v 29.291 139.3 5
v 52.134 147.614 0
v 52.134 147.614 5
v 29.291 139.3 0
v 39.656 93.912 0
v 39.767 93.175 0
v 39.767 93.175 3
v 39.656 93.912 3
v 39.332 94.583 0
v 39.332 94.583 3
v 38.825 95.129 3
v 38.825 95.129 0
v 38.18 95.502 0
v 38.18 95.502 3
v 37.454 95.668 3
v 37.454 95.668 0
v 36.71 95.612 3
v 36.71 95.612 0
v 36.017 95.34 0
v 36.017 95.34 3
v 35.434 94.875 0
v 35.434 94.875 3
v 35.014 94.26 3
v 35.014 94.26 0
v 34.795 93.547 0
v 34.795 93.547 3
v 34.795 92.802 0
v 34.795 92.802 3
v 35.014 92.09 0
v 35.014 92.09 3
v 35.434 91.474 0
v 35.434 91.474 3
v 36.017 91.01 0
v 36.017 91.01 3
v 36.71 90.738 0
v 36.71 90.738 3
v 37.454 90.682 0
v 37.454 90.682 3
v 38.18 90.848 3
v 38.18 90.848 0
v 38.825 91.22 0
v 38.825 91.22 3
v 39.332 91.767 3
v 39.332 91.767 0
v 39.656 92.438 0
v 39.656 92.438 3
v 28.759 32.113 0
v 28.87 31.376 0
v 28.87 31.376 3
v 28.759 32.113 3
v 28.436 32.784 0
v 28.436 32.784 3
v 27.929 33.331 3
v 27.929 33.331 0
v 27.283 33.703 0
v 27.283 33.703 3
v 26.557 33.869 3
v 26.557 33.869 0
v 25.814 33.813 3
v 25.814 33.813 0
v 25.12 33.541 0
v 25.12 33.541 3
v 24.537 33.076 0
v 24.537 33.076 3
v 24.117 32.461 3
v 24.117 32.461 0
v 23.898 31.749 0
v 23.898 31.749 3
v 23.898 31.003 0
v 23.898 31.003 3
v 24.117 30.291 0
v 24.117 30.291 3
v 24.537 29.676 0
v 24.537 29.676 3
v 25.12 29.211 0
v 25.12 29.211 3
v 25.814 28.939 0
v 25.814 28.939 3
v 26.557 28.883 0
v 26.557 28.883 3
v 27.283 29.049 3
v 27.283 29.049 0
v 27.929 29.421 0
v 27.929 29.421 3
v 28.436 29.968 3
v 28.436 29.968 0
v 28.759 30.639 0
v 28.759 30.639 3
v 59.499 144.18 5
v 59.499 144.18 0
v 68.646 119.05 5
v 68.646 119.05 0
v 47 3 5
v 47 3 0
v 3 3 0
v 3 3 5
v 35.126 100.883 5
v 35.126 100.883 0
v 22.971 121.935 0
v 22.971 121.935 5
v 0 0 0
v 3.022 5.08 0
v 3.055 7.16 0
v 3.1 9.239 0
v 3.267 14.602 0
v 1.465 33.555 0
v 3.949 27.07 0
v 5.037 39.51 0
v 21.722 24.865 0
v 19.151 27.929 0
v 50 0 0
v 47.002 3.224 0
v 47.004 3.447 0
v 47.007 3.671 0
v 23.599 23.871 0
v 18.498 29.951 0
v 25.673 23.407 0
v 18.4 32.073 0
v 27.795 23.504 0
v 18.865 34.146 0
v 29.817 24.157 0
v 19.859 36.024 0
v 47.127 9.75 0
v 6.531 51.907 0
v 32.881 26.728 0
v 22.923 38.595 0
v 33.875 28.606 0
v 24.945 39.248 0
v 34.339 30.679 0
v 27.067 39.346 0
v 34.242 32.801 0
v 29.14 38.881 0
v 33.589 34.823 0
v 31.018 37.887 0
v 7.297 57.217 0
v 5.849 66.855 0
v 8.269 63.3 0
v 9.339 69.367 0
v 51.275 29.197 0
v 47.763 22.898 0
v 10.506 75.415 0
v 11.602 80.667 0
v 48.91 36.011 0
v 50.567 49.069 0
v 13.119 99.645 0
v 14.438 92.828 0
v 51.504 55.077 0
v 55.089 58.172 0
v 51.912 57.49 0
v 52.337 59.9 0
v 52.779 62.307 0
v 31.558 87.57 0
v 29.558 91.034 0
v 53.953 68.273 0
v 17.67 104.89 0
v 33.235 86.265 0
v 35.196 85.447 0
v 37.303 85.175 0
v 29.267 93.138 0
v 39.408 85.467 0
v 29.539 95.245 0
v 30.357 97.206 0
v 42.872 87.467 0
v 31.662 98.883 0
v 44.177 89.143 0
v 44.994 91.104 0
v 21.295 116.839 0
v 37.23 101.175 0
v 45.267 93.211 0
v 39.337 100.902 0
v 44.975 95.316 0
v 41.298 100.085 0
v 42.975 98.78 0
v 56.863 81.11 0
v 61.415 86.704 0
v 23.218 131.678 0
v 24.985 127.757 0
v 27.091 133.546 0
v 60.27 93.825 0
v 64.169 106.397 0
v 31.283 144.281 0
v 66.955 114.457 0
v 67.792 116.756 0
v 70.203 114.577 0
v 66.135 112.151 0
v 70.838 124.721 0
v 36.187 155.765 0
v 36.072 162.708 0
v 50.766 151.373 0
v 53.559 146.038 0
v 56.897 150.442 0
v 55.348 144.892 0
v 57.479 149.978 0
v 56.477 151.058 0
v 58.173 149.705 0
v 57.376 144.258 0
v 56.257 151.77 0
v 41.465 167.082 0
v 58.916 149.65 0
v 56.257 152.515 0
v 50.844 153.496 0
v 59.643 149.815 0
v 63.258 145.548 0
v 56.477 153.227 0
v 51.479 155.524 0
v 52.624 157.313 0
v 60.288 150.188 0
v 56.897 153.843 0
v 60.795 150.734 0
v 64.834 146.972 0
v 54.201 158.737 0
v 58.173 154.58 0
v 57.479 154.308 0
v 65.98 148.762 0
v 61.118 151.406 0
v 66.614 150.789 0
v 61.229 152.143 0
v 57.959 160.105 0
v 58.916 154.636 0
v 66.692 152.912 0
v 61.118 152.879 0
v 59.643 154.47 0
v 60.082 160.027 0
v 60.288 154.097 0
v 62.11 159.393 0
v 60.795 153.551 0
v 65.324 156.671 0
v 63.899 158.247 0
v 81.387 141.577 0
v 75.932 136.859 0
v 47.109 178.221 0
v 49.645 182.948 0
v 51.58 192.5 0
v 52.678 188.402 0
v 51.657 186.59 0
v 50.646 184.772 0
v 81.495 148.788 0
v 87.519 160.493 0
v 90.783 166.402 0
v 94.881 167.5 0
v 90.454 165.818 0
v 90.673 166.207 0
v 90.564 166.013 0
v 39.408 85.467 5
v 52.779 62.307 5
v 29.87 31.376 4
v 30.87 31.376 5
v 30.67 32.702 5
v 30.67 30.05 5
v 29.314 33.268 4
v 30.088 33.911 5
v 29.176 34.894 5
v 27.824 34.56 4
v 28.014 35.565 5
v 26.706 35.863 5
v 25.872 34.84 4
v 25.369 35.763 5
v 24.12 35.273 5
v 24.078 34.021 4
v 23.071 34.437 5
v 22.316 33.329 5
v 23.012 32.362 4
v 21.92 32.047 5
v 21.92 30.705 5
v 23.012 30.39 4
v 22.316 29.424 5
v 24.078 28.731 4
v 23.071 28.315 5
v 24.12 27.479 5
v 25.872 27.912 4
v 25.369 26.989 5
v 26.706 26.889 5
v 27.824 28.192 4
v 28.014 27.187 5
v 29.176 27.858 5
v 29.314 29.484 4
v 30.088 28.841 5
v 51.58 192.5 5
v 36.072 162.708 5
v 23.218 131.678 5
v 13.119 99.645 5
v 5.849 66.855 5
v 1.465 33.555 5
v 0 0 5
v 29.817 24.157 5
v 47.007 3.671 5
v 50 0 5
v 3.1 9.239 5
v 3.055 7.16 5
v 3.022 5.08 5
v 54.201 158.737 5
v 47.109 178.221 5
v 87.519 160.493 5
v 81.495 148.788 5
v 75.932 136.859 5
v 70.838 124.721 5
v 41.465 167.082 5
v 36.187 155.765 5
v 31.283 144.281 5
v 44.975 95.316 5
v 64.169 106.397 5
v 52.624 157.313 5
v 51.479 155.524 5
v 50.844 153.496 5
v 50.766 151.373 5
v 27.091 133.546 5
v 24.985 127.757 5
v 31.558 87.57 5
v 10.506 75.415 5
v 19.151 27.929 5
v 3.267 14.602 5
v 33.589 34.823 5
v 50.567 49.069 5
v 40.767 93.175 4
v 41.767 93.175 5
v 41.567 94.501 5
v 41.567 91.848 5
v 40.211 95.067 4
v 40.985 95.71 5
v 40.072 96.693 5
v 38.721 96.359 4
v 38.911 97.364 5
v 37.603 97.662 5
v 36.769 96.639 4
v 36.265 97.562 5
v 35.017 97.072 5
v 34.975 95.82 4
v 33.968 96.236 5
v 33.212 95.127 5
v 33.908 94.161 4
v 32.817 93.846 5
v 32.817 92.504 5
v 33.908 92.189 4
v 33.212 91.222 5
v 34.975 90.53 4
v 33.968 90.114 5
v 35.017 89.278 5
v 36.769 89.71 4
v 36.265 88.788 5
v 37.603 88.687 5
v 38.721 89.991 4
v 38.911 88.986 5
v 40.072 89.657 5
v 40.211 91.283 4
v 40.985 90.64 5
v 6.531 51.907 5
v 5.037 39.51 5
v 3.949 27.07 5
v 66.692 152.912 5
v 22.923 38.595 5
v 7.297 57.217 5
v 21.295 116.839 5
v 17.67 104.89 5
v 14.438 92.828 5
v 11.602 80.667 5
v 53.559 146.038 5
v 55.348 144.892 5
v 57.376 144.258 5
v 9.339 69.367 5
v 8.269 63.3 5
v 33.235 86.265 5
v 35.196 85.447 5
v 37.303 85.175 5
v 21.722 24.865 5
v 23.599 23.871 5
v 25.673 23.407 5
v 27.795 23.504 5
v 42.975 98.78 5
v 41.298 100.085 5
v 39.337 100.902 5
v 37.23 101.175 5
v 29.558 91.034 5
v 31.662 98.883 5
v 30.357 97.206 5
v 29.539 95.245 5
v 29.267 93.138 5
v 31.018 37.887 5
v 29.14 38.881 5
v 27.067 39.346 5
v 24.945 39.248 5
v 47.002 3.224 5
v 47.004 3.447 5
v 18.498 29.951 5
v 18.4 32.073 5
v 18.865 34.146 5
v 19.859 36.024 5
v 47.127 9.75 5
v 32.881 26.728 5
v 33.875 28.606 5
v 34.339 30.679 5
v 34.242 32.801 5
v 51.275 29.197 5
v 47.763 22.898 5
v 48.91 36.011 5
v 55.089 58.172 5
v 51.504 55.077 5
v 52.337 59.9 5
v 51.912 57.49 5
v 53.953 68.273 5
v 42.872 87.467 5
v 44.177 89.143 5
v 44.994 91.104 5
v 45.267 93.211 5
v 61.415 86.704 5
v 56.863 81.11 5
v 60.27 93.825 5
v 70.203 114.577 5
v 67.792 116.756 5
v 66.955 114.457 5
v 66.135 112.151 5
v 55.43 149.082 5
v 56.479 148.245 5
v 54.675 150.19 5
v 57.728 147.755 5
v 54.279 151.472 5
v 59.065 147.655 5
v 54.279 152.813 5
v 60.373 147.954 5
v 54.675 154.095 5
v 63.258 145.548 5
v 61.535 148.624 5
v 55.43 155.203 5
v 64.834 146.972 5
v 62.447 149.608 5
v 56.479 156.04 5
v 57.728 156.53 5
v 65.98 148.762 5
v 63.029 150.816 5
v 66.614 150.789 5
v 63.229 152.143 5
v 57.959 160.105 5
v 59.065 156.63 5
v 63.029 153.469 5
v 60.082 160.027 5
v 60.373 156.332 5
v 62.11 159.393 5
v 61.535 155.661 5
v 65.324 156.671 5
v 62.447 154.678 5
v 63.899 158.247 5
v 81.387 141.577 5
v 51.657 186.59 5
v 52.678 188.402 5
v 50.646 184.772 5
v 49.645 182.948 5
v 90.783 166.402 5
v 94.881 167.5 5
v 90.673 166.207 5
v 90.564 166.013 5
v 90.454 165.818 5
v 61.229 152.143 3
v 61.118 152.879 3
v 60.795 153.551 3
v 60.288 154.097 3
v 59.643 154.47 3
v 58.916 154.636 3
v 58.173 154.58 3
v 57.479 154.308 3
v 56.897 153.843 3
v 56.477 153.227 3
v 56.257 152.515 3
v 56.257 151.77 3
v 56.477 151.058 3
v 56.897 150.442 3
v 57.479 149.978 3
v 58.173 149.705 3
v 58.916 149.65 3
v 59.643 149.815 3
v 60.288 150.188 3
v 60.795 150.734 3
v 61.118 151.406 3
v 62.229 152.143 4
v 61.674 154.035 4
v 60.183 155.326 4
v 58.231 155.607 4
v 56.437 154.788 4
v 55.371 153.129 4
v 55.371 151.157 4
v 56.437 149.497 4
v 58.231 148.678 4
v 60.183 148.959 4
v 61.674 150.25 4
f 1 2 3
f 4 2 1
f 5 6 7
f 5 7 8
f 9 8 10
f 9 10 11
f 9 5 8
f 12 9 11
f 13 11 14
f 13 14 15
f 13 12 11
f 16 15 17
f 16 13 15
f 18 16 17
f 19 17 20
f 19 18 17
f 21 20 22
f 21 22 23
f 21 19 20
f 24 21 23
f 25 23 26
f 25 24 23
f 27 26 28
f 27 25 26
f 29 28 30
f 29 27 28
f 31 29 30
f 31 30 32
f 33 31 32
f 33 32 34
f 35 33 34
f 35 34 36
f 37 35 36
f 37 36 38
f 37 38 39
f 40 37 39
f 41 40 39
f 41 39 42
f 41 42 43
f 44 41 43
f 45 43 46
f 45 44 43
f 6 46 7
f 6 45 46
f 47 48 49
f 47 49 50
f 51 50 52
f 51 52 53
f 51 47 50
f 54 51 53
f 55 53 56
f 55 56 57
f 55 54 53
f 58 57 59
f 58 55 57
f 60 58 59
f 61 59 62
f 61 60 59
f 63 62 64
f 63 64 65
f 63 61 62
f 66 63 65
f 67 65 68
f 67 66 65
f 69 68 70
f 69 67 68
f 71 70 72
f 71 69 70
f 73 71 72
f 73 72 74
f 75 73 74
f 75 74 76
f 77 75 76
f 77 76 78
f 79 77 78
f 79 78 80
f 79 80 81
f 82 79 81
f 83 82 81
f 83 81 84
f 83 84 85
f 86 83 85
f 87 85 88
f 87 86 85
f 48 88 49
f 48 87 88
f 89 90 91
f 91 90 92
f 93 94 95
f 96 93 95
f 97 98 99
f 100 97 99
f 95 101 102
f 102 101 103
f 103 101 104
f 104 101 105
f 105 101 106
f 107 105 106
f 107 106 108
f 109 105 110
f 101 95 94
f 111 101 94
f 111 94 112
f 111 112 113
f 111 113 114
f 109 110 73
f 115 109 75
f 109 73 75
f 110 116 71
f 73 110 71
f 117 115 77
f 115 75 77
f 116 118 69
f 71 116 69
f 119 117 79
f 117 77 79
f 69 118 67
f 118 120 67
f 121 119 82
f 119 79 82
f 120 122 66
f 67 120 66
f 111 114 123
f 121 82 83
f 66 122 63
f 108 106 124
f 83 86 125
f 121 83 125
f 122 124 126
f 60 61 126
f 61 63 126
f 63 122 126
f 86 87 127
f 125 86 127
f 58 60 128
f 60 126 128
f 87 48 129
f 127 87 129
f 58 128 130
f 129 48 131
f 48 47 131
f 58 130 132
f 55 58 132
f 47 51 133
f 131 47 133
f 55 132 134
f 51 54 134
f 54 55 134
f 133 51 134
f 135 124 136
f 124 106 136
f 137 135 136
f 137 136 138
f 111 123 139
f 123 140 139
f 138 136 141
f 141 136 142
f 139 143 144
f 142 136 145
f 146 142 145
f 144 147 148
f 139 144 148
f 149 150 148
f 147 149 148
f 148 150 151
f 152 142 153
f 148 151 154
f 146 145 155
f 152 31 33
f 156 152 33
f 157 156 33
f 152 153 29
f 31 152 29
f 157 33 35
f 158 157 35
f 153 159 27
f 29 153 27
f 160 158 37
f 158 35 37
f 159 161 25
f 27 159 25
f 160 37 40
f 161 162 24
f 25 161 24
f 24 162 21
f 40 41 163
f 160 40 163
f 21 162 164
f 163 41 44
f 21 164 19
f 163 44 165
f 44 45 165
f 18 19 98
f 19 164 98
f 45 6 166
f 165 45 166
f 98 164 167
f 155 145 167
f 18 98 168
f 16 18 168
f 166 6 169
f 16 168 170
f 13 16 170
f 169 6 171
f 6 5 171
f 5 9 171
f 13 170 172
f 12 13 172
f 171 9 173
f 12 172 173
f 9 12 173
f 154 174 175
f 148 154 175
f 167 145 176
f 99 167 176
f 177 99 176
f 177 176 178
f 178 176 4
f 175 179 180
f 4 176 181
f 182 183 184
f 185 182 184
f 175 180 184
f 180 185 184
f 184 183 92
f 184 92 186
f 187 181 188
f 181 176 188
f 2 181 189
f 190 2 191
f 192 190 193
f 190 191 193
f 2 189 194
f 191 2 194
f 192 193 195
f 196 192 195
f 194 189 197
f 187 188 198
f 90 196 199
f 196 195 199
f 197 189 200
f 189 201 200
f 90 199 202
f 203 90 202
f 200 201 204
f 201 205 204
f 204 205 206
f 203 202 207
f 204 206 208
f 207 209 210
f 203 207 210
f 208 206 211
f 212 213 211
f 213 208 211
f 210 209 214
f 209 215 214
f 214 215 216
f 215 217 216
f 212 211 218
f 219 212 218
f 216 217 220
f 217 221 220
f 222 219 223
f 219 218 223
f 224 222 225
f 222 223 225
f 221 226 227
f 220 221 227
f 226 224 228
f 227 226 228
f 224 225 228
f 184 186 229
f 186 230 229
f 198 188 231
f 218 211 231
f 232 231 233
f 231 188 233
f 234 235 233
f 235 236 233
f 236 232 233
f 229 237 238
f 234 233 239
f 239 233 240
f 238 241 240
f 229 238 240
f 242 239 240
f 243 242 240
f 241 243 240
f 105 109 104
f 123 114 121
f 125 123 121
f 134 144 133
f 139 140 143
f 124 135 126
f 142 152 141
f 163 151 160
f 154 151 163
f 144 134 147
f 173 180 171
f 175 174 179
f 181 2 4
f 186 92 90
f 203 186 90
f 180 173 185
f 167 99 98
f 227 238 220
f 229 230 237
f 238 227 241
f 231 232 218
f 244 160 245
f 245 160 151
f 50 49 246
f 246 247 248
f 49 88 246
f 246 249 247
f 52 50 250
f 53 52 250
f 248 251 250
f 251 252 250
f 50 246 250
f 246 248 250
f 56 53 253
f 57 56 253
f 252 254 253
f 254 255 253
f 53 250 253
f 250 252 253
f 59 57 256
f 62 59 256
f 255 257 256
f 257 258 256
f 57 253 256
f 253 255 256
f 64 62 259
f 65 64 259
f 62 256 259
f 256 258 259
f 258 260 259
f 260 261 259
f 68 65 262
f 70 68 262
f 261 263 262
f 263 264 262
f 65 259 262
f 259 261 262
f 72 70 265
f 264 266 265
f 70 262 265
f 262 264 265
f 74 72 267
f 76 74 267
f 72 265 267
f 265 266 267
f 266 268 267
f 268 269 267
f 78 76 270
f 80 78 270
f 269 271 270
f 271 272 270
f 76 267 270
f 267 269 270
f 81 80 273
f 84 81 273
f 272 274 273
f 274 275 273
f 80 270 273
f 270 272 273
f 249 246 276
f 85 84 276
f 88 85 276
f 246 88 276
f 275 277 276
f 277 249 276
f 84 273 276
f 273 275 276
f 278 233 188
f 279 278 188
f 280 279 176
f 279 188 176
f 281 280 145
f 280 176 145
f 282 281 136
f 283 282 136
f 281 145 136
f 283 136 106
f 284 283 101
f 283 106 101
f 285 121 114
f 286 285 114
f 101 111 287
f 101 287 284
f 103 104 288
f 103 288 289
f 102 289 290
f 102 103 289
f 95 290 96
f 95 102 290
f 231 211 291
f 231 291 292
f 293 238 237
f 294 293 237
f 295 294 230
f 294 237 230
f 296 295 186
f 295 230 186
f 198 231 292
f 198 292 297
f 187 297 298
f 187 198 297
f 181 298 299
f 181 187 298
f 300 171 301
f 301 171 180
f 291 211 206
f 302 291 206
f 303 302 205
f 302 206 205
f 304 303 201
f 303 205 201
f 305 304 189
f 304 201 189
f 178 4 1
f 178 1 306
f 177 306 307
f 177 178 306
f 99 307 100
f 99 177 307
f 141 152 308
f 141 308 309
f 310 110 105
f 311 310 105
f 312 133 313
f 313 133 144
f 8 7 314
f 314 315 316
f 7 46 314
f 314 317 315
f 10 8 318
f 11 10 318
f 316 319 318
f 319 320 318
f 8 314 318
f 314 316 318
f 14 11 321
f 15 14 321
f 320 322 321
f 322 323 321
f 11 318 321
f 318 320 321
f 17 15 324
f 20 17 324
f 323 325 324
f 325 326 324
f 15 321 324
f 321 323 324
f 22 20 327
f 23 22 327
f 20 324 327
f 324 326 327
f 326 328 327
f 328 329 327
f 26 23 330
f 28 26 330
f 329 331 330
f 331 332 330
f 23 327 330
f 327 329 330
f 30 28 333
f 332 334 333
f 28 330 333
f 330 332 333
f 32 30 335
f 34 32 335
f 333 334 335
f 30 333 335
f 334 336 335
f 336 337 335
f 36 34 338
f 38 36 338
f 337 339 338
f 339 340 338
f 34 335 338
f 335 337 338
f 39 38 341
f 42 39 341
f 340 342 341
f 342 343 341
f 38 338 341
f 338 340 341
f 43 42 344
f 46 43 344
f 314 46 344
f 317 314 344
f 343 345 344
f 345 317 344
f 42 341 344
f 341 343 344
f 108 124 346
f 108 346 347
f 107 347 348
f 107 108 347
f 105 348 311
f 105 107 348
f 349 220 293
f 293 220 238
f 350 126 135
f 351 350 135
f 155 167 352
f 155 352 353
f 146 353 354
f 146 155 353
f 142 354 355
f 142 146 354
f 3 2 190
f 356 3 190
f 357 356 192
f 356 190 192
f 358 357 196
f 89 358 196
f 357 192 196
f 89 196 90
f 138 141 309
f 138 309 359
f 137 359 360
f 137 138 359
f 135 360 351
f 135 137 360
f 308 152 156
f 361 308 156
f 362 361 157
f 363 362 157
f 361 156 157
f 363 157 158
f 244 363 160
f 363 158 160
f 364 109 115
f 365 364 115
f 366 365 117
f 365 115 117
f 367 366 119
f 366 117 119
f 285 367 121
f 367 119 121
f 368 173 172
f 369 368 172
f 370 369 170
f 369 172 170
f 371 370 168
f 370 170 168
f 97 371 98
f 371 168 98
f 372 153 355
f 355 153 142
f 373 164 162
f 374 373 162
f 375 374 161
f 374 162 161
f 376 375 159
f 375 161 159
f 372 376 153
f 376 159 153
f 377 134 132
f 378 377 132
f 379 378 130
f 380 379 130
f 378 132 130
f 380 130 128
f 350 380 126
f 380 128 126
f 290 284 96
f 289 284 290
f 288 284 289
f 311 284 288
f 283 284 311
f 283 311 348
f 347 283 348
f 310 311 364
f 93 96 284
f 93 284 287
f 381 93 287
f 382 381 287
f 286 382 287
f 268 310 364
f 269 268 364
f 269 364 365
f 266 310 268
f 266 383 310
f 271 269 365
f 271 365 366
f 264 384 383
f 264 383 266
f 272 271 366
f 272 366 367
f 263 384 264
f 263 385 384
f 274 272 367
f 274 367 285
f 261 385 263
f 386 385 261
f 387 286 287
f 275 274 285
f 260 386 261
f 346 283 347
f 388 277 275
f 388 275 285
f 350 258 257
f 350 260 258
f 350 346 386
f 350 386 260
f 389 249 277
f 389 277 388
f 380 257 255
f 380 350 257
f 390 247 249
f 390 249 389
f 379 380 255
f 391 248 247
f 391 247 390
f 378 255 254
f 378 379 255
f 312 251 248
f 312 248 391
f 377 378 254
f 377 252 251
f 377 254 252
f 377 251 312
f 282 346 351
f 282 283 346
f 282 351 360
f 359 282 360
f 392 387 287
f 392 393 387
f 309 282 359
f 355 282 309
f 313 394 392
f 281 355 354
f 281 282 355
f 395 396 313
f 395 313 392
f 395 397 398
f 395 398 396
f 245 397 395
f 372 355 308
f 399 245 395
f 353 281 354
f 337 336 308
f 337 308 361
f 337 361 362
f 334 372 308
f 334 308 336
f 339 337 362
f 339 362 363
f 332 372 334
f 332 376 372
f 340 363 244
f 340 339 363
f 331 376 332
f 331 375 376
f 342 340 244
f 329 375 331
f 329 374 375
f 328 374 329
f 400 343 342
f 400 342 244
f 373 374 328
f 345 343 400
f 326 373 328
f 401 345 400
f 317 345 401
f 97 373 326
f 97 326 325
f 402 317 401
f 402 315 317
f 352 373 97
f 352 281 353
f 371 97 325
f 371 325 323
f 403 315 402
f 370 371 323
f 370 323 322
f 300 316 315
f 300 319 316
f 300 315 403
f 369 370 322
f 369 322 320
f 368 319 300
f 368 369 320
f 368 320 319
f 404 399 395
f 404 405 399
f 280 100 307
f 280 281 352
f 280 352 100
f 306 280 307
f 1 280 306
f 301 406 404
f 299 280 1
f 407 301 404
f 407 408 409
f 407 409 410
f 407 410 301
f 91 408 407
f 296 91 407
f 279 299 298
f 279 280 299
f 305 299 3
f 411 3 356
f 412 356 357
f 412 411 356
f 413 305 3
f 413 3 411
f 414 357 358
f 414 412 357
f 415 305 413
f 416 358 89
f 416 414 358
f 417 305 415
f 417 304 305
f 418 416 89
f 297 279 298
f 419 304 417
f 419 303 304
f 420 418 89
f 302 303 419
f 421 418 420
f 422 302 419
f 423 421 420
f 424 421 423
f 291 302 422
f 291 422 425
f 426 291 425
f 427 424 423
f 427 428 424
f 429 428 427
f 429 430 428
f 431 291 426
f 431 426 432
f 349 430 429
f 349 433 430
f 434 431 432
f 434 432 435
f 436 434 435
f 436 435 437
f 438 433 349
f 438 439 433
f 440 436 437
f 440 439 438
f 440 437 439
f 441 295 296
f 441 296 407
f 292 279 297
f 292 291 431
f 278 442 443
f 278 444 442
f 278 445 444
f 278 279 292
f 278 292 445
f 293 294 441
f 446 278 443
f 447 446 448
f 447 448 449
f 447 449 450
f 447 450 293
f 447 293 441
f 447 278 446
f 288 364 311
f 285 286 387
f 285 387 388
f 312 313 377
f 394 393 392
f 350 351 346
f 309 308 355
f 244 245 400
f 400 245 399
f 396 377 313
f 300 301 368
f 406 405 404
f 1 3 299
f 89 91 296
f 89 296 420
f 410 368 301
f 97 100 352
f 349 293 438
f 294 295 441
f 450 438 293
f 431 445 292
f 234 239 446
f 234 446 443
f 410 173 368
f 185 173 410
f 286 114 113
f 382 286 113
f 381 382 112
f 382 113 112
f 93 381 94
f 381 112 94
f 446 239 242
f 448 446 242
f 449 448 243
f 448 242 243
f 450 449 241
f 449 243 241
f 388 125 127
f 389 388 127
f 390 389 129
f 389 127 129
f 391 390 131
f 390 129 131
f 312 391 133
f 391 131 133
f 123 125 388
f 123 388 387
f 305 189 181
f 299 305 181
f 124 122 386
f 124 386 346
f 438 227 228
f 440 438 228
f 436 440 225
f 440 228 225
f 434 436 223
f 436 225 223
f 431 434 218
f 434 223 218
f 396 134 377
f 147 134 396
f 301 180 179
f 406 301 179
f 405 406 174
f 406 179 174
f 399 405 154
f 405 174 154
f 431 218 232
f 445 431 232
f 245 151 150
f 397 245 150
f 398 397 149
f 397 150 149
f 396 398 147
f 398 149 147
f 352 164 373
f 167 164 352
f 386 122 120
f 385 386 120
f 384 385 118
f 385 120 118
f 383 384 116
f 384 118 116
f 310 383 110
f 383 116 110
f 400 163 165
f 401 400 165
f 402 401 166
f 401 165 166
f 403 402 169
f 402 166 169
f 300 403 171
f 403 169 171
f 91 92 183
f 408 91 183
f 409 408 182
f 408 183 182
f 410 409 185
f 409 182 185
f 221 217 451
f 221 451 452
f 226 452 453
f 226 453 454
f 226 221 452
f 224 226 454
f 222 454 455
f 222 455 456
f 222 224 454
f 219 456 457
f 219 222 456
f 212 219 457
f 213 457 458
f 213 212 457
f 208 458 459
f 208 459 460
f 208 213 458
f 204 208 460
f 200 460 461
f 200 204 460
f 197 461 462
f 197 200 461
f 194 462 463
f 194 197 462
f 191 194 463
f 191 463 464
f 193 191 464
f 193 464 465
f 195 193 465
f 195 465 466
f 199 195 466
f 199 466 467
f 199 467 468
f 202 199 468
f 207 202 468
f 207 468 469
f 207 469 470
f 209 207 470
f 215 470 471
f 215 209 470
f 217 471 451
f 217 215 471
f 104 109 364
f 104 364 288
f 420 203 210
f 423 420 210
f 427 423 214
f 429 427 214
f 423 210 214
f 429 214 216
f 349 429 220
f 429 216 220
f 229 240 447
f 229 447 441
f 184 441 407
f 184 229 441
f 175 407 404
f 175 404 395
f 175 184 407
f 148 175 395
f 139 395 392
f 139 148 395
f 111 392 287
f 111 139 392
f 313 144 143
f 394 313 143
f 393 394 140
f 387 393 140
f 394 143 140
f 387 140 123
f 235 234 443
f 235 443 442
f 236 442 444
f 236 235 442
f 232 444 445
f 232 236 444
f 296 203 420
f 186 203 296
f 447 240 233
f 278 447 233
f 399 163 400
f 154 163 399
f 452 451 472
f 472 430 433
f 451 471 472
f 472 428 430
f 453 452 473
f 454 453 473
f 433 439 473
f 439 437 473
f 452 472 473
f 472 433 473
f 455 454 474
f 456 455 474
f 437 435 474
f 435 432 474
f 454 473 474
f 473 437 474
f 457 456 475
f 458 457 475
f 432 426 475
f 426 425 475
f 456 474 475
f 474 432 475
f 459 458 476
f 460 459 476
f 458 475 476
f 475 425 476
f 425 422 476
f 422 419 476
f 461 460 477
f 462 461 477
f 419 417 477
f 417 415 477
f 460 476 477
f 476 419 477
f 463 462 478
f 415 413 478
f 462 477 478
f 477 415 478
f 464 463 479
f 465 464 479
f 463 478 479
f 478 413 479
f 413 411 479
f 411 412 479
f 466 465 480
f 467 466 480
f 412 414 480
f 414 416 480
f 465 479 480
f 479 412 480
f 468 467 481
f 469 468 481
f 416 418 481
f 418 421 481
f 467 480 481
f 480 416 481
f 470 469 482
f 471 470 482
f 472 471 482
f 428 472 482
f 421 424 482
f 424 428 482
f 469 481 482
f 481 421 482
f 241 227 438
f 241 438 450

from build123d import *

# Parameters (mm, degrees)
SKETCH_R     = 2.5
PAD_DEPTH    = 5
CHAMFER_SIZE = 2


with BuildPart() as part:
    # Sketch → Pad (new body)
    with BuildSketch(Plane.XY):
        with BuildLine():
            ThreePointArc((51.58022, 192.5), (13.118557, 99.645332), (0, 0))
            Line((50, 0), (0, 0))
            ThreePointArc((94.88149, 167.5), (61.414848, 86.70438), (50, 0))
            Line((94.88149, 167.5), (51.58022, 192.5))
        make_face()
        with Locations((26.369909, 31.376067)):
            Circle(SKETCH_R, mode=Mode.SUBTRACT)
        with Locations((58.729197, 152.142574)):
            Circle(SKETCH_R, mode=Mode.SUBTRACT)
        with Locations((37.266703, 93.174856)):
            Circle(SKETCH_R, mode=Mode.SUBTRACT)
        with BuildLine():
            ThreePointArc((52.678296, 188.401924), (51.150584, 185.681361), (49.645145, 182.948411))
            Line((57.959305, 160.105442), (49.645145, 182.948411))
            ThreePointArc((65.323984, 156.671236), (62.110143, 159.393037), (57.959305, 160.105442))
            Line((65.323984, 156.671236), (90.453773, 165.817731))
            ThreePointArc((90.783414, 166.401924), (90.618448, 166.109909), (90.453773, 165.817731))
            Line((90.783414, 166.401924), (52.678296, 188.401924))
        make_face(mode=Mode.SUBTRACT)
        with BuildLine():
            Line((47, 3), (3, 3))
            ThreePointArc((3.099971, 9.239456), (3.037245, 6.119932), (3, 3))
            Line((21.721729, 24.864967), (3.099971, 9.239456))
            ThreePointArc((21.721729, 24.864967), (25.672663, 23.40651), (29.816831, 24.156737))
            Line((29.816831, 24.156737), (47.006619, 3.670746))
            ThreePointArc((47.006619, 3.670746), (47.003143, 3.335375), (47, 3))
        make_face(mode=Mode.SUBTRACT)
        with BuildLine():
            ThreePointArc((19.858808, 36.024247), (18.400351, 32.073313), (19.150579, 27.929145))
            Line((19.150579, 27.929145), (3.267378, 14.601557))
            ThreePointArc((6.531221, 51.907447), (4.44189, 33.29452), (3.267378, 14.601557))
            Line((19.858808, 36.024247), (6.531221, 51.907447))
        make_face(mode=Mode.SUBTRACT)
        with BuildLine():
            Line((22.922986, 38.595397), (7.297475, 57.217156))
            ThreePointArc((10.506305, 75.415332), (8.791837, 66.335649), (7.297475, 57.217156))
            Line((31.558499, 87.569822), (10.506305, 75.415332))
            ThreePointArc((31.558499, 87.569822), (35.19615, 85.44745), (39.407635, 85.466652))
            Line((39.407635, 85.466652), (52.778916, 62.306914))
            ThreePointArc((52.778916, 62.306914), (52.121868, 58.695396), (51.50408, 55.076955))
            Line((31.018088, 37.887168), (51.50408, 55.076955))
            ThreePointArc((31.018088, 37.887168), (27.067155, 39.345625), (22.922986, 38.595397))
        make_face(mode=Mode.SUBTRACT)
        with BuildLine():
            Line((32.881009, 26.727888), (47.127329, 9.749785))
            ThreePointArc((50.567342, 49.06931), (48.272929, 29.459801), (47.127329, 9.749785))
            Line((33.589239, 34.82299), (50.567342, 49.06931))
            ThreePointArc((32.881009, 26.727888), (34.339466, 30.678821), (33.589239, 34.82299))
        make_face(mode=Mode.SUBTRACT)
        with BuildLine():
            ThreePointArc((54.200535, 158.737362), (51.478734, 155.52352), (50.766329, 151.372683))
            Line((50.766329, 151.372683), (31.282699, 144.281222))
            ThreePointArc((47.109074, 178.220991), (38.779749, 161.445154), (31.282699, 144.281222))
            Line((54.200535, 158.737362), (47.109074, 178.220991))
        make_face(mode=Mode.SUBTRACT)
        with BuildLine():
            Line((52.134409, 147.613912), (29.291441, 139.299752))
            ThreePointArc((29.291441, 139.299752), (26.026349, 130.655724), (22.97128, 121.935254))
            Line((35.12577, 100.88306), (22.97128, 121.935254))
            ThreePointArc((42.974906, 98.77989), (39.337255, 100.902263), (35.12577, 100.88306))
            Line((42.974906, 98.77989), (66.134645, 112.151172))
            ThreePointArc((68.645583, 119.049918), (67.371384, 115.607362), (66.134645, 112.151172))
            Line((59.499088, 144.179706), (68.645583, 119.049918))
            ThreePointArc((52.134409, 147.613912), (55.348251, 144.892112), (59.499088, 144.179706))
        make_face(mode=Mode.SUBTRACT)
        with BuildLine():
            Line((63.257859, 145.547787), (70.838167, 124.72106))
            ThreePointArc((87.518791, 160.492774), (78.655902, 142.850599), (70.838167, 124.72106))
            Line((66.692065, 152.912466), (87.518791, 160.492774))
            ThreePointArc((63.257859, 145.547787), (65.979659, 148.761628), (66.692065, 152.912466))
        make_face(mode=Mode.SUBTRACT)
        with BuildLine():
            Line((42.871737, 87.466652), (53.953407, 68.272637))
            ThreePointArc((64.168922, 106.397459), (58.504211, 87.484283), (53.953407, 68.272637))
            Line((44.974906, 95.315789), (64.168922, 106.397459))
            ThreePointArc((42.871737, 87.466652), (44.994109, 91.104304), (44.974906, 95.315789))
        make_face(mode=Mode.SUBTRACT)
        with BuildLine():
            Line((29.558499, 91.033924), (11.602288, 80.666901))
            ThreePointArc((21.294646, 116.83927), (16.004956, 98.871924), (11.602288, 80.666901))
            Line((31.661668, 98.88306), (21.294646, 116.83927))
            ThreePointArc((31.661668, 98.88306), (29.539296, 95.245409), (29.558499, 91.033924))
        make_face(mode=Mode.SUBTRACT)
    extrude(amount=PAD_DEPTH)

    # Chamfer
    chamfer_edges = [part.edges().sort_by_distance(p)[0] for p in [
        (23.869909, 31.376067, 5),
        (34.766703, 93.174856, 5),
        (56.229197, 152.142574, 5),
    ]]
    chamfer(chamfer_edges, length=CHAMFER_SIZE)


solid = part.part
